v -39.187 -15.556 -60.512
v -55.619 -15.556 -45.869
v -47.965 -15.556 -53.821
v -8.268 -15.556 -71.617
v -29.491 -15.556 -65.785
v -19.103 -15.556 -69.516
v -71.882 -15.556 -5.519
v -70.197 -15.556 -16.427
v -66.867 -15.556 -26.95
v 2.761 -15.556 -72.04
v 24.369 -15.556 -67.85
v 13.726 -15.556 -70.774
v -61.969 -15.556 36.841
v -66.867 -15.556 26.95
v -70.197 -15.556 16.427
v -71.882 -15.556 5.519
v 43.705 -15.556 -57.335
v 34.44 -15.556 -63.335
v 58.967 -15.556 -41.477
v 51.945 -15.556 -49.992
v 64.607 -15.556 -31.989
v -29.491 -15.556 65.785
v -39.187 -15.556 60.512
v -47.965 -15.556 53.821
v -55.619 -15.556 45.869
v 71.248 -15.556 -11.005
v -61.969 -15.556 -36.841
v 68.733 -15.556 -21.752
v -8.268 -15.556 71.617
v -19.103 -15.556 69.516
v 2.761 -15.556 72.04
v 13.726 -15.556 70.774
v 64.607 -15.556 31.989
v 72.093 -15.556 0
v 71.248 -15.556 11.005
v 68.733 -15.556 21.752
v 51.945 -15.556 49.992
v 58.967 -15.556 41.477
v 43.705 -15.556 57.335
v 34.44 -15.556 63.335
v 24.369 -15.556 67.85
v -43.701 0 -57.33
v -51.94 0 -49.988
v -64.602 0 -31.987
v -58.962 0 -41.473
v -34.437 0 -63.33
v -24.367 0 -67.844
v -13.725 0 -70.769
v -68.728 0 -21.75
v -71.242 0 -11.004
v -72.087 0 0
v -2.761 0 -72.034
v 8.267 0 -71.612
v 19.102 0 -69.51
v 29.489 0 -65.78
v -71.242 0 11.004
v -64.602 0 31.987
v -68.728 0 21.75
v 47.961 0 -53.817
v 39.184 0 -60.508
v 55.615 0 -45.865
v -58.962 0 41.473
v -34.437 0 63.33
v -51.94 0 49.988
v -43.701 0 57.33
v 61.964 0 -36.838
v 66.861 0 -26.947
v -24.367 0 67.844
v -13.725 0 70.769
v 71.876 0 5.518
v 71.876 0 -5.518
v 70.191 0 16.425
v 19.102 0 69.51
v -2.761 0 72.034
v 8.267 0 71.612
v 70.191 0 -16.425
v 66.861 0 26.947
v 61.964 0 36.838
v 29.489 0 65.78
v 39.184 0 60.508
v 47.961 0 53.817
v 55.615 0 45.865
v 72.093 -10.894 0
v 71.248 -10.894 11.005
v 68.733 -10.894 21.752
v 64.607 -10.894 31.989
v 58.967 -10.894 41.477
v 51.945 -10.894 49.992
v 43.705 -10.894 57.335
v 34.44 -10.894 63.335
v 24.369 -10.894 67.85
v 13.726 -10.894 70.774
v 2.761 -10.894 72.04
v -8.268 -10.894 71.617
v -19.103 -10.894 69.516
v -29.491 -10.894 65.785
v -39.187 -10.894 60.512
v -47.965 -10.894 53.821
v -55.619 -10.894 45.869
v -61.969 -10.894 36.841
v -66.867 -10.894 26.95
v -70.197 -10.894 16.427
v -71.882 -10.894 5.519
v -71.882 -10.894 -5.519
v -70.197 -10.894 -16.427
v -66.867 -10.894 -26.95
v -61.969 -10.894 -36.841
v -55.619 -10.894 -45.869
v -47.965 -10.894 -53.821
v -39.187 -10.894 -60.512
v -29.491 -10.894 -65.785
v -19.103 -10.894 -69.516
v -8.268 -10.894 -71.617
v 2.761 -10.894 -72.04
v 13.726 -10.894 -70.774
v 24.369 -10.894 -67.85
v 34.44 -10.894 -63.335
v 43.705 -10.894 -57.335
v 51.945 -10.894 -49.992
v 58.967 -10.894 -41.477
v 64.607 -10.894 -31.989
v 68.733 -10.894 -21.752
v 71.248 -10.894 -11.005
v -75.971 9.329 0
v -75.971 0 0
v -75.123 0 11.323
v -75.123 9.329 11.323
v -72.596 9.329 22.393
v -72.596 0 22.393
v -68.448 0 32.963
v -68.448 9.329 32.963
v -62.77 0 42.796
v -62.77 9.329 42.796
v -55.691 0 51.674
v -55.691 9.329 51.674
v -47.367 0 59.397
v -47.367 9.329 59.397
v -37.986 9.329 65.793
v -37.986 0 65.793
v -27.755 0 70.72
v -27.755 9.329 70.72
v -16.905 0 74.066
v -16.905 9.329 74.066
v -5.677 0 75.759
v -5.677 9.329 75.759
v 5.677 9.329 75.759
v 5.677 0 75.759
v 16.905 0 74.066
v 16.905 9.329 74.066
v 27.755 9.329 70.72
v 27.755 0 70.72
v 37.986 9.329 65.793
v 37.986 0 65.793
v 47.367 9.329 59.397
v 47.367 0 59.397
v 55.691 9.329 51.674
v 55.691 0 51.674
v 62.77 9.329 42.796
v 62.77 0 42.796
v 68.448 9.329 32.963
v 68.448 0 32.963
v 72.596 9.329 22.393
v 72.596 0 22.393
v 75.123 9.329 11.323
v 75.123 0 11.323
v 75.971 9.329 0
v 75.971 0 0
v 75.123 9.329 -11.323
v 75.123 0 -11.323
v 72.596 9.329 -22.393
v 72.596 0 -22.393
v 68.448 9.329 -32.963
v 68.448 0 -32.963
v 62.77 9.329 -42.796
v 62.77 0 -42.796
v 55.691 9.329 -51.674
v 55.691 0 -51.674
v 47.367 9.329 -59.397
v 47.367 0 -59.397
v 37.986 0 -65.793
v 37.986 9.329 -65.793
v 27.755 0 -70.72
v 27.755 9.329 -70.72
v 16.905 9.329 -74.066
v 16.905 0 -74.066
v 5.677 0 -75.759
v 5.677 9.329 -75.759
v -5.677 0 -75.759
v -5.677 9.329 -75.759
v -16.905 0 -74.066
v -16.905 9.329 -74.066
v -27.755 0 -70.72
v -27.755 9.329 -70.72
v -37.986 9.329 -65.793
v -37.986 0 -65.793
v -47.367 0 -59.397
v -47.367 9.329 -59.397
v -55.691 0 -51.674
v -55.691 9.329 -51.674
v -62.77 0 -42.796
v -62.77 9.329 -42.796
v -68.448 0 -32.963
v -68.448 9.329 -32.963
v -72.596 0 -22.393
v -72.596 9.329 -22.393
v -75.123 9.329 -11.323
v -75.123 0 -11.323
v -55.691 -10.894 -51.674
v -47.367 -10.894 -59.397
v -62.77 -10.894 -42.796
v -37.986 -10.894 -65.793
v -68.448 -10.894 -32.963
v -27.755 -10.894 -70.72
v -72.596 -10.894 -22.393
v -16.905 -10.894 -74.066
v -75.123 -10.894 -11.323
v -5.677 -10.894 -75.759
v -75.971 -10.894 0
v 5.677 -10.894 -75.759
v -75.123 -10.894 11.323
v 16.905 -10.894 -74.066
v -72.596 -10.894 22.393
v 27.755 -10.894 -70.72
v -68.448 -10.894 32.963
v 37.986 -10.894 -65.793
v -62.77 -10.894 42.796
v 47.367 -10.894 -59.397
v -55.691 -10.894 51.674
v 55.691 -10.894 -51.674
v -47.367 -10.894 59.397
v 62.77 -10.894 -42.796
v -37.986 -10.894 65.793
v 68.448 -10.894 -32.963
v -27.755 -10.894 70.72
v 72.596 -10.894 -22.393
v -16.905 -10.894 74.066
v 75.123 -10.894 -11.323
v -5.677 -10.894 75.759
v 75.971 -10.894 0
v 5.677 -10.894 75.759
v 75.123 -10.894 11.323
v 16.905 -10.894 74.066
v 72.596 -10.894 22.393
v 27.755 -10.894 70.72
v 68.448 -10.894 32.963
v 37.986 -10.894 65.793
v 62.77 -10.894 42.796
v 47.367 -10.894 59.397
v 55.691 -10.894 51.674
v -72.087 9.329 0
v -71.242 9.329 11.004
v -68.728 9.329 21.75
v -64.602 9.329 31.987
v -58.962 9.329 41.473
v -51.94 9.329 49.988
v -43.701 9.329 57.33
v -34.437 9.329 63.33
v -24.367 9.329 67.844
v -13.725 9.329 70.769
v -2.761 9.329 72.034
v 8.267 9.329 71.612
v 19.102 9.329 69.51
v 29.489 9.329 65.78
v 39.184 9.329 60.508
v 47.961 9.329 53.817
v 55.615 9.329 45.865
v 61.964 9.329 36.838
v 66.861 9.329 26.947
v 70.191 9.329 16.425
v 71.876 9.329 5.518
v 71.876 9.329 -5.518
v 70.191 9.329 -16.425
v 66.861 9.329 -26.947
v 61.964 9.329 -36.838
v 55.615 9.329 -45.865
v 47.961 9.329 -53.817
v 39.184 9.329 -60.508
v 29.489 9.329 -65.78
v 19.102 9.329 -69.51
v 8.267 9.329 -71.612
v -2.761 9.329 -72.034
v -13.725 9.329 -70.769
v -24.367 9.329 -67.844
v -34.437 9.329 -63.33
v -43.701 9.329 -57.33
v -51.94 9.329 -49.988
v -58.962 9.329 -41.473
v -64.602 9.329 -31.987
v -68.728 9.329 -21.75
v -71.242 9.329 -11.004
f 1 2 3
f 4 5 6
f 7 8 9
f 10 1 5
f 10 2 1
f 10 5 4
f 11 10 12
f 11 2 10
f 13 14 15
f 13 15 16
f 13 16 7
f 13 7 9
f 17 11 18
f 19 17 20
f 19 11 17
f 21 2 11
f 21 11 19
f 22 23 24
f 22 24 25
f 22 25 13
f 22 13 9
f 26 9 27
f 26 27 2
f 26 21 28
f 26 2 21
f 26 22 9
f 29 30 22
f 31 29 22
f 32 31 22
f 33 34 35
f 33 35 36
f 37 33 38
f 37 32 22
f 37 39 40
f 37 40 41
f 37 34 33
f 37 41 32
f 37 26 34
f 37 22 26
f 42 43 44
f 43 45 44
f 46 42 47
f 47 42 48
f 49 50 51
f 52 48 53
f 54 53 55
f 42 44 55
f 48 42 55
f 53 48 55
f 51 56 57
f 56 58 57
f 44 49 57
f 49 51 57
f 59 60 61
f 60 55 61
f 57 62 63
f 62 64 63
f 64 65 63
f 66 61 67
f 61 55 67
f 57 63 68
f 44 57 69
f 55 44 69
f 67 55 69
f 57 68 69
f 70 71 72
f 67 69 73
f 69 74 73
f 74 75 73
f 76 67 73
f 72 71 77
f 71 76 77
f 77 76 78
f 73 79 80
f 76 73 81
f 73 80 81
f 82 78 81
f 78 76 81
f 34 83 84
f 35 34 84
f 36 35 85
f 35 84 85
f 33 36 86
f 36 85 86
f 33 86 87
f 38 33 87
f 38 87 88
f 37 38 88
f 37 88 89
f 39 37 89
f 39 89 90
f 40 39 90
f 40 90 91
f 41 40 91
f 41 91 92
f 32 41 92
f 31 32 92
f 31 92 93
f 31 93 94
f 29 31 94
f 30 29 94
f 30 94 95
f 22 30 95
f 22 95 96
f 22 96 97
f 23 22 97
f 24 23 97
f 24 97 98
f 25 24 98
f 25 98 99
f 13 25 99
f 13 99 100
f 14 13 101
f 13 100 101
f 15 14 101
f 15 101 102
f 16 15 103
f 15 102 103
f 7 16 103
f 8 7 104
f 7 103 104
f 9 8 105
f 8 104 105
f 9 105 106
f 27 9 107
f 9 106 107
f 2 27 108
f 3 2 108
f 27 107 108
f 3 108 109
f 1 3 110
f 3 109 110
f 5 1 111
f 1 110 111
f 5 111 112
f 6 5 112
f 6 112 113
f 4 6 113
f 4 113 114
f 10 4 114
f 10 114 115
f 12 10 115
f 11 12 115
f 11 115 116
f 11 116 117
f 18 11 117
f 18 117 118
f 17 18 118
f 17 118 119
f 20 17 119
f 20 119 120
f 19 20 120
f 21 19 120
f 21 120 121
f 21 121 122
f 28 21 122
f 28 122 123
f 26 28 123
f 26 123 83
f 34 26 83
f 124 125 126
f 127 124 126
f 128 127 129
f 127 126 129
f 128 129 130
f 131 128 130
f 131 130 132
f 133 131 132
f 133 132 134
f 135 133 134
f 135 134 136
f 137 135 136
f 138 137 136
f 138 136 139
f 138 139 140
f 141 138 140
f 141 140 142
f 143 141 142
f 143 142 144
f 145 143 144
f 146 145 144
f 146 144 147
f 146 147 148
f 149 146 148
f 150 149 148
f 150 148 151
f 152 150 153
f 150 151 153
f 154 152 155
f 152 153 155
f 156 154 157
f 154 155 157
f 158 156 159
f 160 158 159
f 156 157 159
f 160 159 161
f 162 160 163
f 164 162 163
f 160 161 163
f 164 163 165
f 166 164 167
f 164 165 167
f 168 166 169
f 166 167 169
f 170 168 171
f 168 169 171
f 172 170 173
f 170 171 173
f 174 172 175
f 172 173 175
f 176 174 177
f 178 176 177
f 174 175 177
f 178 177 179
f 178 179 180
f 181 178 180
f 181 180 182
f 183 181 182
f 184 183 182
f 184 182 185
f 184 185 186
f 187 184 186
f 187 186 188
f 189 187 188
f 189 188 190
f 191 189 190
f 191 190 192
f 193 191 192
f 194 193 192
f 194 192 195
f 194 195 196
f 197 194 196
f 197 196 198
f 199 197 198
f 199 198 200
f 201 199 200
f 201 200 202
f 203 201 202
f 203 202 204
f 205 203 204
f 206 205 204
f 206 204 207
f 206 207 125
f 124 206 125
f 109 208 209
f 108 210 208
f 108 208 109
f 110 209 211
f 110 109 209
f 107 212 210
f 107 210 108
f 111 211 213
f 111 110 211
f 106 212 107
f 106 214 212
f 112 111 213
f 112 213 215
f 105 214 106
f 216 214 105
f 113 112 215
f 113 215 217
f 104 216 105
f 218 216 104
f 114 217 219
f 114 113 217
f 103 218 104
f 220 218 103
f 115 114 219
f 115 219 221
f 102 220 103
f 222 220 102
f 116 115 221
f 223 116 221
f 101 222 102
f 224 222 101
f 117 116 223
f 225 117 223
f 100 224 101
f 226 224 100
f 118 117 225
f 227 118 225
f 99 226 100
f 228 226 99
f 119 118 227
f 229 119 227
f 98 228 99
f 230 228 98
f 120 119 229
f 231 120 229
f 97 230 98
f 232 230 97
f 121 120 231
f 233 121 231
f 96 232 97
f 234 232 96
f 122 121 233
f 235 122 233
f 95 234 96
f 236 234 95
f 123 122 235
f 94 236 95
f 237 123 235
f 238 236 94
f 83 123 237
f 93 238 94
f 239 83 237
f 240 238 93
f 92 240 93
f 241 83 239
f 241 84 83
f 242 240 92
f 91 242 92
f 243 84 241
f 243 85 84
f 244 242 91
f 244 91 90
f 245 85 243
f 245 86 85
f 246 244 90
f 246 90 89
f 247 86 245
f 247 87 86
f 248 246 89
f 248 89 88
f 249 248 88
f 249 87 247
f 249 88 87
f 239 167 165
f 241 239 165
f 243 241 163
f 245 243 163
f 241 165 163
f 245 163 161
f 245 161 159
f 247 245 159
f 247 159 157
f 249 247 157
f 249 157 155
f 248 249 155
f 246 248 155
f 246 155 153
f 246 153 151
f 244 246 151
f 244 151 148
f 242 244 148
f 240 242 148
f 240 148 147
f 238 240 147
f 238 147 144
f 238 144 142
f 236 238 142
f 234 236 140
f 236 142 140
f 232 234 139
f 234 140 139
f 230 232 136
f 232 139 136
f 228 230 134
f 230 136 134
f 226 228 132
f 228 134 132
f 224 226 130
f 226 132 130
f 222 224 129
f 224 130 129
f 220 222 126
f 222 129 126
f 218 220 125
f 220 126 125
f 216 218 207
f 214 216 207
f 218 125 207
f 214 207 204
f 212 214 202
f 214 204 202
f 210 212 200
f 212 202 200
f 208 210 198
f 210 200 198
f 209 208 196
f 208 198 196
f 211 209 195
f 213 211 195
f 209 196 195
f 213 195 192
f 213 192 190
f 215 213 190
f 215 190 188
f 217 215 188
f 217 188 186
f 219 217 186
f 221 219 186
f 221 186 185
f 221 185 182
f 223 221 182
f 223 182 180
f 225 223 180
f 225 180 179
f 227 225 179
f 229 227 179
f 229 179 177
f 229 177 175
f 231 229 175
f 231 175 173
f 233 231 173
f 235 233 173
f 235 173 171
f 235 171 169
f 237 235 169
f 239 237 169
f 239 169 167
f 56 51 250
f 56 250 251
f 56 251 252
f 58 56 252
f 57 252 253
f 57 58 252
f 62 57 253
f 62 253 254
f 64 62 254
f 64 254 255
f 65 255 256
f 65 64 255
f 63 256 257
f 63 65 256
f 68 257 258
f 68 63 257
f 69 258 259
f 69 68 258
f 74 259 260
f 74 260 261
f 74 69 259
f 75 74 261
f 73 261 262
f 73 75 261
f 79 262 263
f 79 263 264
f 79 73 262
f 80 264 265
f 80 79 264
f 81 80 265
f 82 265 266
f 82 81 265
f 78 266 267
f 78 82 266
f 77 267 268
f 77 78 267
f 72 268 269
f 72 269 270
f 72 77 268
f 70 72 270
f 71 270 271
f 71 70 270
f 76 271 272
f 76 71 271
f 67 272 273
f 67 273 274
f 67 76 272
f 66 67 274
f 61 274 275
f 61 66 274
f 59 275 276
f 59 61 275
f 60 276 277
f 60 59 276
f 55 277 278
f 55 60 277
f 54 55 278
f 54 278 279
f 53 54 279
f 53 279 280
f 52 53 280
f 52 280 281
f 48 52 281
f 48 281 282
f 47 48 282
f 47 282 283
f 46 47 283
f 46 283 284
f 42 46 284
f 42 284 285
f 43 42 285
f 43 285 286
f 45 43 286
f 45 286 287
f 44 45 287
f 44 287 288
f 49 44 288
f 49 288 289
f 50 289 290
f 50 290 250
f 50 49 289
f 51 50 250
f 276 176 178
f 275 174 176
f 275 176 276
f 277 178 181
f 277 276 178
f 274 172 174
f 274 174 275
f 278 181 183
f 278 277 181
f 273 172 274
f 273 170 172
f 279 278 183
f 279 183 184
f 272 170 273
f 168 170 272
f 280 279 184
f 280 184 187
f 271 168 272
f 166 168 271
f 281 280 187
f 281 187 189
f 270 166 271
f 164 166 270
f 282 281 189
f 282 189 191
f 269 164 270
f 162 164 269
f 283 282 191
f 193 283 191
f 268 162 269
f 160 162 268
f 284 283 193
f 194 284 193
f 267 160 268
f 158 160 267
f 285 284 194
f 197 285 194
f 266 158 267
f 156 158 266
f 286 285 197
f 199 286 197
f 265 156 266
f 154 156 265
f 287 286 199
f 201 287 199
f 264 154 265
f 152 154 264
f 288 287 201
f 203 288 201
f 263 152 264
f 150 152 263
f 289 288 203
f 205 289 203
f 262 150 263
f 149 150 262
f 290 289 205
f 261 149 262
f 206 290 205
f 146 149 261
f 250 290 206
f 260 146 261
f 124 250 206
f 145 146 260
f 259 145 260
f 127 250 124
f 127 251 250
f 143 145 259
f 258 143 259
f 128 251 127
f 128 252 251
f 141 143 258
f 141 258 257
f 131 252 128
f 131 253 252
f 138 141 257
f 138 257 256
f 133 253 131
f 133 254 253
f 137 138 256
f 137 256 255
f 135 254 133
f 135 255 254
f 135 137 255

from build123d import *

# Parameters (mm, degrees)
F0_R     = 75.971248
F0_R_2   = 70.641117
F1_DEPTH = 10.893734
F2_R     = 72.093094
F3_DEPTH = 15.55609
F4_R     = 75.971248
F4_R_2   = 72.087222
F5_DEPTH = 9.329332


with BuildPart() as f1:
    # F0 (on Front) → F1 (new body)
    with BuildSketch(Plane.XZ):
        Circle(F0_R)
        Circle(F0_R_2, mode=Mode.SUBTRACT)
    extrude(amount=F1_DEPTH)

    # F2 (on Front) → F3 (join)
    with BuildSketch(Plane.XZ):
        Circle(F2_R)
    extrude(amount=F3_DEPTH)

    # F4 (on face) → F5 (join)
    with BuildSketch(Plane(origin=(0, 0, 0), x_dir=(-1, 0, 0), z_dir=(0, 1, 0))):
        Circle(F4_R)
        Circle(F4_R_2, mode=Mode.SUBTRACT)
    extrude(amount=F5_DEPTH)


solid = f1.part
